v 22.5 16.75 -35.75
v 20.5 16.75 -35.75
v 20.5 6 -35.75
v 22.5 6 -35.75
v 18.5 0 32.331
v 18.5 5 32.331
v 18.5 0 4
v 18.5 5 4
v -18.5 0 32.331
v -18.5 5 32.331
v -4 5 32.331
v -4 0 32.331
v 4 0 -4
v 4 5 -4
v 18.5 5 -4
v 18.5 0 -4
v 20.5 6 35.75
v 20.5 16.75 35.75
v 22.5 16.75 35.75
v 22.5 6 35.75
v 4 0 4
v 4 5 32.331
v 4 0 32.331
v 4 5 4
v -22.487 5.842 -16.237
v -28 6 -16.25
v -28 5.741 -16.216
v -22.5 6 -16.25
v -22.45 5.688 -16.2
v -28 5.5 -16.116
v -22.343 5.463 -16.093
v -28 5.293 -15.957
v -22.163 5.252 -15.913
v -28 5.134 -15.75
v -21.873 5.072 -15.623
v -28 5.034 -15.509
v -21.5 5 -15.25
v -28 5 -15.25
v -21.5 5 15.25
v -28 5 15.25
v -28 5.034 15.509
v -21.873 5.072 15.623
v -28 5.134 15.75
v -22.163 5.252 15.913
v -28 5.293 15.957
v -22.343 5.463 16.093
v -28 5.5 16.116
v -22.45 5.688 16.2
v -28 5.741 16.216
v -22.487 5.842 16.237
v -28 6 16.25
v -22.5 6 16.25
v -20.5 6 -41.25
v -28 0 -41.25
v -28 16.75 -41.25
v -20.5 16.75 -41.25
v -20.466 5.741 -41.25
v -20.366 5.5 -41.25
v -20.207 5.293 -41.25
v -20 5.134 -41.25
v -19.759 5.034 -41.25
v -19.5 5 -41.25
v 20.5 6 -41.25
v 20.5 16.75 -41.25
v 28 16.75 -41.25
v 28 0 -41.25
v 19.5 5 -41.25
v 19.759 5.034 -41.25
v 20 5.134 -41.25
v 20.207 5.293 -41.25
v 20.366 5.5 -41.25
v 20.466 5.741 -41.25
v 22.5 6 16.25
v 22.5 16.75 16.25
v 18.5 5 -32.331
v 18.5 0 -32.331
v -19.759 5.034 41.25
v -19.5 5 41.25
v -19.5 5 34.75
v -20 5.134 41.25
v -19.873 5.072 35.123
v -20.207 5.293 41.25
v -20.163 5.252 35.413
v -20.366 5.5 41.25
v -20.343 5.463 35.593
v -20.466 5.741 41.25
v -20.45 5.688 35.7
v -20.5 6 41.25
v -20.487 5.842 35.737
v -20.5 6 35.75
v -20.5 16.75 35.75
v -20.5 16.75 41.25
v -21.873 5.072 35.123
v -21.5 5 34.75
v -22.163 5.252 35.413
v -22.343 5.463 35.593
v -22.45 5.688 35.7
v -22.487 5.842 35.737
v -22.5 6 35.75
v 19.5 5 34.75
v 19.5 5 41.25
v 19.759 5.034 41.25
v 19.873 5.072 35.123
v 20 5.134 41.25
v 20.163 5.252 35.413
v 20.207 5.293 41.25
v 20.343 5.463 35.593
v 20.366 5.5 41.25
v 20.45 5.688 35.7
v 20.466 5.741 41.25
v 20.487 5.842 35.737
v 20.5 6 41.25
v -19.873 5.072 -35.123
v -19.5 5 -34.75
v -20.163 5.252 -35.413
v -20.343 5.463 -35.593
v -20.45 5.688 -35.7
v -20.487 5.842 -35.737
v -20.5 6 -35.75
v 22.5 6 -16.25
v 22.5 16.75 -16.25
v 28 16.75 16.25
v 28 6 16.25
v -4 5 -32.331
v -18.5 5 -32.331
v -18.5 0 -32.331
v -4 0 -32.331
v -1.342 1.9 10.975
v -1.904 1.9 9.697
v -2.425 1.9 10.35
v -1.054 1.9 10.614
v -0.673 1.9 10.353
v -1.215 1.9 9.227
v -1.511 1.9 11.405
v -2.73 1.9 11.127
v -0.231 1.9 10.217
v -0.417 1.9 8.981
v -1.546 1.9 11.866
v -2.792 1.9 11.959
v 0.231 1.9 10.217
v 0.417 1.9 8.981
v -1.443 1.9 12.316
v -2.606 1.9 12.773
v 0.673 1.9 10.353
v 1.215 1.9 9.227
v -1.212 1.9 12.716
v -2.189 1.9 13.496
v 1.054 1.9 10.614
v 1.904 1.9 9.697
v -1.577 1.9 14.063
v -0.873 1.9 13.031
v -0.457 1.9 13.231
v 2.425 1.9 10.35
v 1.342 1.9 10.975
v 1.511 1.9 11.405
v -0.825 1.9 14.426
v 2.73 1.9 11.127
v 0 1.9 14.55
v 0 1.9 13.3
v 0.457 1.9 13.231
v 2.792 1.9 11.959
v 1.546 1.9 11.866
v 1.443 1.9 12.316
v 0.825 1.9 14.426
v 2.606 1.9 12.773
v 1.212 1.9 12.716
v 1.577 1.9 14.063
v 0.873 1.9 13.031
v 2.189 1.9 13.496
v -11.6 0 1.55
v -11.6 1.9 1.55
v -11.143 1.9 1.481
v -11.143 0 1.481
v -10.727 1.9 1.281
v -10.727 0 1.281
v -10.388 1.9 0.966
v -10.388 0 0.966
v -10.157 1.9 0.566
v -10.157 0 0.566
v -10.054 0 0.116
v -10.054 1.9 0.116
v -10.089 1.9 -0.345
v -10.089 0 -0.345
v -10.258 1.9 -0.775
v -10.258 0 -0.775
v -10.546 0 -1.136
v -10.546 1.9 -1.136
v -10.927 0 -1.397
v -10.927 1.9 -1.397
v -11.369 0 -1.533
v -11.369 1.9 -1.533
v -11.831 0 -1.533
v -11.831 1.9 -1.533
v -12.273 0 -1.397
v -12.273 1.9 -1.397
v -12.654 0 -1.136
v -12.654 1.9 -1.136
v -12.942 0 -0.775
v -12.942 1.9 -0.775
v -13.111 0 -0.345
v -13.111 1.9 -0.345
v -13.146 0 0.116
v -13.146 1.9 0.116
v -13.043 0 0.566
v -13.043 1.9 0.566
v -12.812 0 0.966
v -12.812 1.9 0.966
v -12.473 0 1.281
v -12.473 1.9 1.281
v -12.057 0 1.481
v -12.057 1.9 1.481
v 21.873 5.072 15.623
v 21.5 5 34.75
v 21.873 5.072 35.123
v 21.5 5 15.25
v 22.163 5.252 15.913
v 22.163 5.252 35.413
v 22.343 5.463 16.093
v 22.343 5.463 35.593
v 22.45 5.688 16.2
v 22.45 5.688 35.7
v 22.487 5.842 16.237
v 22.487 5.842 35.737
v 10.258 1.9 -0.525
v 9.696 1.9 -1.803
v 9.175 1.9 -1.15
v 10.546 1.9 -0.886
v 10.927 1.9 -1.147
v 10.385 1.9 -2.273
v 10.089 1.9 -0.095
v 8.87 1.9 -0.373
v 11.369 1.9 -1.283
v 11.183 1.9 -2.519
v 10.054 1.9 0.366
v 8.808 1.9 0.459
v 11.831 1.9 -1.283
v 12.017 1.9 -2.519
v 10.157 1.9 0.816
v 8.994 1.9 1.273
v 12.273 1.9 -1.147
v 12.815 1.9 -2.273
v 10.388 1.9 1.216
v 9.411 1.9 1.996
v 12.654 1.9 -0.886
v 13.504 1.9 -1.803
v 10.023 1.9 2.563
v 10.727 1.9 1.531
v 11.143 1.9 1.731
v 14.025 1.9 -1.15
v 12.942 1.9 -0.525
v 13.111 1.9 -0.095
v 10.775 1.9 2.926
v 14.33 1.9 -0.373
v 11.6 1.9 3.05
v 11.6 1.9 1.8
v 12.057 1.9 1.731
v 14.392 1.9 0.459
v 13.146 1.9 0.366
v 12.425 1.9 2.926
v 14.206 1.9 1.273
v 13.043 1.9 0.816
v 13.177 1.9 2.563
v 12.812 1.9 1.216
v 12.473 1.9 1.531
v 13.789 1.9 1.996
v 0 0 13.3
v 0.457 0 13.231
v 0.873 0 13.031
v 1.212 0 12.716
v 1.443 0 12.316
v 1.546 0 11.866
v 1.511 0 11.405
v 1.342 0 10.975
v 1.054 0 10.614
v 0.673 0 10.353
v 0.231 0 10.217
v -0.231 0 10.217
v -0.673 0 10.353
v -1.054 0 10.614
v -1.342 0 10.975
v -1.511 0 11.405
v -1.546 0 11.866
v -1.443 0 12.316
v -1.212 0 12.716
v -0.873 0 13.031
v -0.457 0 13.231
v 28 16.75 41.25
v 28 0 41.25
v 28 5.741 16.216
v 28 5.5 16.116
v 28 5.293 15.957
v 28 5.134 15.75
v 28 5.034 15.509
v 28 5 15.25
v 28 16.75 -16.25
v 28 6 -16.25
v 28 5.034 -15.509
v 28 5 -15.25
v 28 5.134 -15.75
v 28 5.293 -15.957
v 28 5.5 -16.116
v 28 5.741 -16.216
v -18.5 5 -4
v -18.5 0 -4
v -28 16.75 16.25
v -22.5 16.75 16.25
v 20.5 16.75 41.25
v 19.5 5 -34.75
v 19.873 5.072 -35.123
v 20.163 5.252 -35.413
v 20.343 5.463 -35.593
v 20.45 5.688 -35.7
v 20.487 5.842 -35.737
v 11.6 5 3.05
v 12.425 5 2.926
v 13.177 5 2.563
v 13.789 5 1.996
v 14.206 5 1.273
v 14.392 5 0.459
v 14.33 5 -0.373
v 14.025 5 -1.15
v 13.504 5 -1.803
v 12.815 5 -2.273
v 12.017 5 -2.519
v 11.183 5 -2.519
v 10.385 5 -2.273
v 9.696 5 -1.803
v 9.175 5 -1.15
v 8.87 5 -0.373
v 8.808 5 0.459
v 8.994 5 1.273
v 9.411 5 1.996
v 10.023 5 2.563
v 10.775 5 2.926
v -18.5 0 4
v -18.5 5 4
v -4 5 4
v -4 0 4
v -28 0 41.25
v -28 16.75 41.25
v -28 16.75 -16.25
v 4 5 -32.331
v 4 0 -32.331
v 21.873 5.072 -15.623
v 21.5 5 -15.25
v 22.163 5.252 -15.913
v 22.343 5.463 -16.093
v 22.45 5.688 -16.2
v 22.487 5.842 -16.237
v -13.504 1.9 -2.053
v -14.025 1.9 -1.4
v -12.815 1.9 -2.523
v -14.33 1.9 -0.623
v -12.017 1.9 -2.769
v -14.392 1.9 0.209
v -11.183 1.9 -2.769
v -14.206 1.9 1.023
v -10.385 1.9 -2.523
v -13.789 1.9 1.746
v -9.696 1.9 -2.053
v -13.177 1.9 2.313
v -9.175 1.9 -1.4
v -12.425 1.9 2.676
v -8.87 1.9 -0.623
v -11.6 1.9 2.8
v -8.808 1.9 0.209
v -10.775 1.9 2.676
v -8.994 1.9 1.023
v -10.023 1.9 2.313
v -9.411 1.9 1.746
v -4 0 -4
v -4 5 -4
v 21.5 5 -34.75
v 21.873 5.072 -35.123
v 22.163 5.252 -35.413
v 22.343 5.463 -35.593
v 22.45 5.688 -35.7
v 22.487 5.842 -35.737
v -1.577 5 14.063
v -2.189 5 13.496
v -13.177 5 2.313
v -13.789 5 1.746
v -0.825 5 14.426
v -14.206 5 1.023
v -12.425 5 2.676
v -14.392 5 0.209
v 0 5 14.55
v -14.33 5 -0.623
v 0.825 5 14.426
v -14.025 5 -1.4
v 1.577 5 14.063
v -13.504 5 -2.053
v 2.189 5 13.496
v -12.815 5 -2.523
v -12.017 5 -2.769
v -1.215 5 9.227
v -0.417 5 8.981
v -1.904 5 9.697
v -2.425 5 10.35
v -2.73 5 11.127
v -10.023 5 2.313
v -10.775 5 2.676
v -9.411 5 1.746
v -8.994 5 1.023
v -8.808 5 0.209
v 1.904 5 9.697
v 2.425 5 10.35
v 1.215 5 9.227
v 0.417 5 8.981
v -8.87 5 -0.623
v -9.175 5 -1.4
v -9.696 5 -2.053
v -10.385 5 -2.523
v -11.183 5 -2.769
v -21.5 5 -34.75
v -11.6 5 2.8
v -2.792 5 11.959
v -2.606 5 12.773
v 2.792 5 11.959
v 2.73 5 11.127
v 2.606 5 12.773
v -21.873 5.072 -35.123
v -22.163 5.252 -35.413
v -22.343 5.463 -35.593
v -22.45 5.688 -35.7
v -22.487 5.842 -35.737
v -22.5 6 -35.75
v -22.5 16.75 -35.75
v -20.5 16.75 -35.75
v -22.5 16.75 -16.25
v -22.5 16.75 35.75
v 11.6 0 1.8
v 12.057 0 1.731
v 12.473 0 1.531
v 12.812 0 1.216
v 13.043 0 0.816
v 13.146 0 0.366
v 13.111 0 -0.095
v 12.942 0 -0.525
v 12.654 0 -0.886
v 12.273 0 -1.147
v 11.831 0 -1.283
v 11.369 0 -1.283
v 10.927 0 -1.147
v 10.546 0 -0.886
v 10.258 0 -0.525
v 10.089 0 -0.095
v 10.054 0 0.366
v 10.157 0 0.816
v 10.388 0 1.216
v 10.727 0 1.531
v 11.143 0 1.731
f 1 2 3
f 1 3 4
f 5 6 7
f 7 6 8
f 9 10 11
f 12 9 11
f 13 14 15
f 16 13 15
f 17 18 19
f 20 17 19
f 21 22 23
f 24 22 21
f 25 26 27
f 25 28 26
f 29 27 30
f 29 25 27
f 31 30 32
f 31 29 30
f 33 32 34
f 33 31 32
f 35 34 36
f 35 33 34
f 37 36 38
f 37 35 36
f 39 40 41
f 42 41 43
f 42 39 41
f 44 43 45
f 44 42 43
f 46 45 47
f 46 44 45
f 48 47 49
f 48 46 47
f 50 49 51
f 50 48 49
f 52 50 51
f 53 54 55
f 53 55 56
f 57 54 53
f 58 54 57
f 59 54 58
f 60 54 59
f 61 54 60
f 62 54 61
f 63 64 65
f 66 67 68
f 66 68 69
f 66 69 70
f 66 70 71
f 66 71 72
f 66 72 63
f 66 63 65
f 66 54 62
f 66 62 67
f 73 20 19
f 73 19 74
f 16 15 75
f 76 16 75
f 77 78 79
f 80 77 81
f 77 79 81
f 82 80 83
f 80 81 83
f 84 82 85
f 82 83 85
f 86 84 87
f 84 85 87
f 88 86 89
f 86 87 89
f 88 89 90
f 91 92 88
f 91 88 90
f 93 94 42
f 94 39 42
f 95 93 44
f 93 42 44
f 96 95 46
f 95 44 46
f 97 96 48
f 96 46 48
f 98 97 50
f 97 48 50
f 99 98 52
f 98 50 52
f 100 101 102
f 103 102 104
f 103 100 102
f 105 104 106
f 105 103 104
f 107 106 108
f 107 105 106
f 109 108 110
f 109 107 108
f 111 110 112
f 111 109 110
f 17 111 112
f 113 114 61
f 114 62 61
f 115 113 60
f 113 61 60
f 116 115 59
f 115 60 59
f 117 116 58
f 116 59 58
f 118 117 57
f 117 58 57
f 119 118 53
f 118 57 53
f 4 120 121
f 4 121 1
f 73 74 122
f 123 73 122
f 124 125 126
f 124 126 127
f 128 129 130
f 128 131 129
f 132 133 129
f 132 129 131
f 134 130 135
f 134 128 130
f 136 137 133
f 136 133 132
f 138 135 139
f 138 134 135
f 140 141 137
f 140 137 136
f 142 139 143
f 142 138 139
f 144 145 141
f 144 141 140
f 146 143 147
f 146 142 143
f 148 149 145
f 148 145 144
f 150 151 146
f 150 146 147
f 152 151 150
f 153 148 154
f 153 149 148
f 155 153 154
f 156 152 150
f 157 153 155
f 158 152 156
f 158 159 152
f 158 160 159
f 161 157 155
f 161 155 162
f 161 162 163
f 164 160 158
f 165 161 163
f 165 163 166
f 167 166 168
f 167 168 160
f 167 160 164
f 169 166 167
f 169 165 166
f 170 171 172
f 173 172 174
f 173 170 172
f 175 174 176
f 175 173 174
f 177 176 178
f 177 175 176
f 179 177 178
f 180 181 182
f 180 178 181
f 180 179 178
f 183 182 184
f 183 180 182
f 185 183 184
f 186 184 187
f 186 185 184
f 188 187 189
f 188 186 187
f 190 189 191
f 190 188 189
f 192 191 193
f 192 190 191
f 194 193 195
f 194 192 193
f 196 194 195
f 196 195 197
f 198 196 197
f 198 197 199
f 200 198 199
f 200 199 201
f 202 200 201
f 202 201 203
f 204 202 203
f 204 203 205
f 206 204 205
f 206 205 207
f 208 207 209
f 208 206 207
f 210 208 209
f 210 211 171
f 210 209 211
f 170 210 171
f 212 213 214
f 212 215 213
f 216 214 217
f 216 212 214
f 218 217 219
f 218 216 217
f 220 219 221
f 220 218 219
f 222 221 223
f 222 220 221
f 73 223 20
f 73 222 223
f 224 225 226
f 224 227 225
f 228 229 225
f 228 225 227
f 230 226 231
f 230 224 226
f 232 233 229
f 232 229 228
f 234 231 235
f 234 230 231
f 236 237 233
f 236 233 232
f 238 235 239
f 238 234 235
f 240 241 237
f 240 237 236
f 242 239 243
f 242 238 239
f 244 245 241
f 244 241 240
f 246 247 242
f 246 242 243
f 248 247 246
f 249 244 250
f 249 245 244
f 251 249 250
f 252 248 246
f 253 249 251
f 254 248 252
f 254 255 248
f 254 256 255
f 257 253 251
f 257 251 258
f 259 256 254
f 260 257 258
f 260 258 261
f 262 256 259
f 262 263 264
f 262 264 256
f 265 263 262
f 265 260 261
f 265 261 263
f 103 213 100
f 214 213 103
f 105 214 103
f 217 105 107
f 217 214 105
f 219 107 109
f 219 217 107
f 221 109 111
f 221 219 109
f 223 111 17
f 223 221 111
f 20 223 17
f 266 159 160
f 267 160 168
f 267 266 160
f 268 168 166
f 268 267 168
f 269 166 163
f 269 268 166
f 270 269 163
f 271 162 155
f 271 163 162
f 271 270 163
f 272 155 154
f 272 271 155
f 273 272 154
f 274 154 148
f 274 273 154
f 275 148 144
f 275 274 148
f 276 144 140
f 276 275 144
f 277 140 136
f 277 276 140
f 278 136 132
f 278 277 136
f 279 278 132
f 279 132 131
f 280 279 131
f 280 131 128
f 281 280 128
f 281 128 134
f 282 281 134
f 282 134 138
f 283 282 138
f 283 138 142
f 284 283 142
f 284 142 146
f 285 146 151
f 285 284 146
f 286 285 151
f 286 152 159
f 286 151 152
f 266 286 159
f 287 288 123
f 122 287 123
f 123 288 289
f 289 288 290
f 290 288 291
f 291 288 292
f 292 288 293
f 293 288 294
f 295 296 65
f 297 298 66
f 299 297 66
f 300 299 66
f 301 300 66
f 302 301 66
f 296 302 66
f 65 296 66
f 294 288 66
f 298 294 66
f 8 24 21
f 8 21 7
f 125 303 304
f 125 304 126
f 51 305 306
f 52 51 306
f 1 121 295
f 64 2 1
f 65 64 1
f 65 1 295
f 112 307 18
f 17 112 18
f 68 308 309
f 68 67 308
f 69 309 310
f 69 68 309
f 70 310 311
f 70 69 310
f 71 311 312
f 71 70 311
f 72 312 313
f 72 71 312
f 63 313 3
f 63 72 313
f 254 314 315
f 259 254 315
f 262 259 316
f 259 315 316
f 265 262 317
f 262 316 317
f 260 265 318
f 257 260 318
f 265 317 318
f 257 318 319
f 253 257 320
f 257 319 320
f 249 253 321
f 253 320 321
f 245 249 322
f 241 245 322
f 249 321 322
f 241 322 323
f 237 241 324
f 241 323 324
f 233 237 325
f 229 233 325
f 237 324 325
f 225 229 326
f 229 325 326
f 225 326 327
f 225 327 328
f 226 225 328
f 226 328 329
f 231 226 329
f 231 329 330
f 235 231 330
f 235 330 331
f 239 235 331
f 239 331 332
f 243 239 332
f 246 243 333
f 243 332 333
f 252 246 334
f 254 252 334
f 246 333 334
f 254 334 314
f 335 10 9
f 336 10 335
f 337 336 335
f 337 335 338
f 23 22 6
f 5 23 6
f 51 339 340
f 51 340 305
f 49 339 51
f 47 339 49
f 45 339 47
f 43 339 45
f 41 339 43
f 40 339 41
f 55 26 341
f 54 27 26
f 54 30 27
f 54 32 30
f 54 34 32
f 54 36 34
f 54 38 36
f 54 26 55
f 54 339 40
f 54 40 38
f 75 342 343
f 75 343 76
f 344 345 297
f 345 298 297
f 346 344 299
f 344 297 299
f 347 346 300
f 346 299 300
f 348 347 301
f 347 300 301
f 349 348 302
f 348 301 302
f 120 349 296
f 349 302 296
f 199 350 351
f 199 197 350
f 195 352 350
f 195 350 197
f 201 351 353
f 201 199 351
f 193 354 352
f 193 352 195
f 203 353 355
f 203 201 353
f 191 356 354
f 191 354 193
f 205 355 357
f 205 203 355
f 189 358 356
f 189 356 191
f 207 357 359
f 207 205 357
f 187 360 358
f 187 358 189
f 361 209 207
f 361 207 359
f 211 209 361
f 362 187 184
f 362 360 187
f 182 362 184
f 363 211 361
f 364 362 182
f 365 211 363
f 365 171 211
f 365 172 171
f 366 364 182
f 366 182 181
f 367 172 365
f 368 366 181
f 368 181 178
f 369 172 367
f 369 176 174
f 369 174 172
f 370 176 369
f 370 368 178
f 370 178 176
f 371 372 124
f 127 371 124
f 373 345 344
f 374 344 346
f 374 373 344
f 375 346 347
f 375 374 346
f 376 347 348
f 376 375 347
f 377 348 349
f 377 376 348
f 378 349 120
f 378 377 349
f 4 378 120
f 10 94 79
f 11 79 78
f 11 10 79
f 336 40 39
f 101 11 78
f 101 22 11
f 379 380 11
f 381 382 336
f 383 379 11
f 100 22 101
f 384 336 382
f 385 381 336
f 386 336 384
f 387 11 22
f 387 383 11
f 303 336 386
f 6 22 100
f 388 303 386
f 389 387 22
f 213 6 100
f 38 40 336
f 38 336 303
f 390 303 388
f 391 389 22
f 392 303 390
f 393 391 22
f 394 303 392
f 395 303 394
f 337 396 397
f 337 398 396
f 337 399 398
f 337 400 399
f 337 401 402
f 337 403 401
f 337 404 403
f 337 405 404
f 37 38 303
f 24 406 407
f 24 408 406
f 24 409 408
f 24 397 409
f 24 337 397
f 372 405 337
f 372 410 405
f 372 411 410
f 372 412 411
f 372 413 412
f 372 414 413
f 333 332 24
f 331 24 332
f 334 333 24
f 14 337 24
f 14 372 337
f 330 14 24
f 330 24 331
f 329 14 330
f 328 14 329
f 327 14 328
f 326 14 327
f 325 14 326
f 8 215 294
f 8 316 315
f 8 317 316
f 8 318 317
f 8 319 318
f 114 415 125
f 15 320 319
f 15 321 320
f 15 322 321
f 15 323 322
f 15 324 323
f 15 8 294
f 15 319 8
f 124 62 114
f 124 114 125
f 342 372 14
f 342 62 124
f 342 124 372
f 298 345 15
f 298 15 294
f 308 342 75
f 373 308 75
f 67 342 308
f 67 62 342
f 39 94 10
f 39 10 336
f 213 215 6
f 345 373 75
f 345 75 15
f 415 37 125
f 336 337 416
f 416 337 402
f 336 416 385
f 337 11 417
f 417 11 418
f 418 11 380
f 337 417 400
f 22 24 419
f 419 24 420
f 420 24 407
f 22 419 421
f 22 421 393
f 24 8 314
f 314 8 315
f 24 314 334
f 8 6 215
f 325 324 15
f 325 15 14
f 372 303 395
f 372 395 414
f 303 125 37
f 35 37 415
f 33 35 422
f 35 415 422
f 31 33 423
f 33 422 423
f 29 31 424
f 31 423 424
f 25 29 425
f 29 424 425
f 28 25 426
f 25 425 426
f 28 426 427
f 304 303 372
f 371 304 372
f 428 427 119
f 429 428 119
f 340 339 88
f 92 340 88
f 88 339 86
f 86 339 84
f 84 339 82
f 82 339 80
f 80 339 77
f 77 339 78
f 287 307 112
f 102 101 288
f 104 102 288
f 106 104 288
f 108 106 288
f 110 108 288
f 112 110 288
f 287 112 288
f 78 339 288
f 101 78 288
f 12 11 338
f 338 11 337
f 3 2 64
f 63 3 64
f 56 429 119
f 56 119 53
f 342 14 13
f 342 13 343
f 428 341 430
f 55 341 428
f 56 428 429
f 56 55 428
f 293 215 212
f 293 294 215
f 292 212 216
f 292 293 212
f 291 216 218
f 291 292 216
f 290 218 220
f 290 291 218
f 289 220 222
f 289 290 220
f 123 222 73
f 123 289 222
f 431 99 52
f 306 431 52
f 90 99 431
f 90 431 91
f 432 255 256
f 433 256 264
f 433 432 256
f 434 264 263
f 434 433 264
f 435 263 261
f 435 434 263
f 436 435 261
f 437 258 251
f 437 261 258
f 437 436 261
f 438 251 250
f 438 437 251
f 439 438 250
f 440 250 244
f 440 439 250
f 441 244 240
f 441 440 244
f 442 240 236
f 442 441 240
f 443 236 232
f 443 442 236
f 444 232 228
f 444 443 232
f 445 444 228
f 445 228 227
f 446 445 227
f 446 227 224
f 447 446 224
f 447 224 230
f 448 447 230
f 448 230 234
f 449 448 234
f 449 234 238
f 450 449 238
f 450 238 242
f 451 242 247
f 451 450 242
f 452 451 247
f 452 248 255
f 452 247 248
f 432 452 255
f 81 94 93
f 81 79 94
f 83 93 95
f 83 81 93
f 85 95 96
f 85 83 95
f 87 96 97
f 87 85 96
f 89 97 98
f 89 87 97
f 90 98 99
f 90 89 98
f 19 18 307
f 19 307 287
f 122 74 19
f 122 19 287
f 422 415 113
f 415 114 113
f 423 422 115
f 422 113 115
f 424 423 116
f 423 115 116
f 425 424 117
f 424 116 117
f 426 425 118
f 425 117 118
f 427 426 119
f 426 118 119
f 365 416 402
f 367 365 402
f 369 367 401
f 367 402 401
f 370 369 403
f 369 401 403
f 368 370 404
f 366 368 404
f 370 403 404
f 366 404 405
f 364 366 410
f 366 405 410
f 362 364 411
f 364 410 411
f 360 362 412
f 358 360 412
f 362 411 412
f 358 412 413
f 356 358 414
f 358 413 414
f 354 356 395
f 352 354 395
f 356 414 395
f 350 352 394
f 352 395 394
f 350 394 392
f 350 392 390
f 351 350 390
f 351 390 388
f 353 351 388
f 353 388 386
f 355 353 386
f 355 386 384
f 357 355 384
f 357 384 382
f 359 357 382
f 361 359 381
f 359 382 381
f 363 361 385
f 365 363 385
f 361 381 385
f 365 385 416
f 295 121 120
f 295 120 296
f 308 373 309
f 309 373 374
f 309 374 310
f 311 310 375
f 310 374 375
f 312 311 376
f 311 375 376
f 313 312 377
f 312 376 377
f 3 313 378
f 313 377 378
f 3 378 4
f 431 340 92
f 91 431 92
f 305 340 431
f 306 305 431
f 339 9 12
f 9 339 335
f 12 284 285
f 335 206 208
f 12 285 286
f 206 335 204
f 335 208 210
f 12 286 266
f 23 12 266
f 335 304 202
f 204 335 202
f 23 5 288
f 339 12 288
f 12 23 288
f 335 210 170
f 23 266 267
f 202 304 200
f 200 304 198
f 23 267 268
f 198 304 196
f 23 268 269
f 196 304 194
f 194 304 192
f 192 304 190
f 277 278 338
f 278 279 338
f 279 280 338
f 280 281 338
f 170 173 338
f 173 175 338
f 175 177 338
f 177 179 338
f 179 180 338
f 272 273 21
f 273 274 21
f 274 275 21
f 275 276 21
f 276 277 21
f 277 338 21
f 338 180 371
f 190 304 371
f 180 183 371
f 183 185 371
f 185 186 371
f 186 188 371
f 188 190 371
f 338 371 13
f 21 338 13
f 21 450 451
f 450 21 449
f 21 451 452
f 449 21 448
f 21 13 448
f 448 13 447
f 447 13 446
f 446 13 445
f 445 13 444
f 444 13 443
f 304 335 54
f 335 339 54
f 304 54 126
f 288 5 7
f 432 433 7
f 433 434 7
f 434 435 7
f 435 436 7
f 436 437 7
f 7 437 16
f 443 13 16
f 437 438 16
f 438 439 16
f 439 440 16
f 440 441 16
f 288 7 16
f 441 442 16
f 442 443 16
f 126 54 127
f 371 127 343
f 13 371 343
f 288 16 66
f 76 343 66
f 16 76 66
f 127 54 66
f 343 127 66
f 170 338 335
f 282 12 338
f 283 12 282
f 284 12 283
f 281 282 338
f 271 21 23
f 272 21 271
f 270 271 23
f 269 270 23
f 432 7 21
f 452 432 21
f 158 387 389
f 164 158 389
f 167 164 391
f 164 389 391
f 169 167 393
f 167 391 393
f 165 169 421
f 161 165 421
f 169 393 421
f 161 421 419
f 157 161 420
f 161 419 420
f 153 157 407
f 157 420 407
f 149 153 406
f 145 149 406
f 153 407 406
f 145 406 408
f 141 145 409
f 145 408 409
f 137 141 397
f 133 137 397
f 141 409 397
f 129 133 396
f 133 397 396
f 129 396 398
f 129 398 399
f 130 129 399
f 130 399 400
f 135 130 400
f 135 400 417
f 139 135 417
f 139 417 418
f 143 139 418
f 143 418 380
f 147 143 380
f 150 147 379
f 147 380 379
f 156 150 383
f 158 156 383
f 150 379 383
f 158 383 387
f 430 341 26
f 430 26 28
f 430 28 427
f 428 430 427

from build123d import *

# Parameters (mm, degrees)
SKETCH1_W           = 56
SKETCH1_H           = 82.5
SKETCH1_R           = 1.55
BOSS_EXTRUDE1_DEPTH = 5
SKETCH2_W           = 56
SKETCH2_H           = 82.5
SKETCH2_W_2         = 45
SKETCH2_H_2         = 71.5
BOSS_EXTRUDE2_DEPTH = 11.75
SKETCH3_W           = 5.5
SKETCH3_H           = 32.5
SKETCH3_W_2         = 41
SKETCH3_H_2         = 5.5
CUT_EXTRUDE1_DEPTH  = 11.75
FILLET1_R           = 1
SKETCH5_R           = 2.8
CUT_EXTRUDE2_DEPTH  = 3.1
SKETCH6_W           = 14.5
SKETCH6_H           = 28.330895985
CUT_EXTRUDE4_DEPTH  = 52.221333446


with BuildPart() as part:
    # Sketch1 → Boss-Extrude1 (new body)
    with BuildSketch(Plane(origin=(0, 0, 0), x_dir=(1, 0, 0), z_dir=(0, 1, 0))):
        Rectangle(SKETCH1_W, SKETCH1_H)
        with Locations(Location((-11.6, 0, 0), (0, 0, 270))):
            Circle(SKETCH1_R, mode=Mode.SUBTRACT)
        with Locations(Location((0, -11.75, 0), (0, 0, 270))):
            Circle(SKETCH1_R, mode=Mode.SUBTRACT)
        with Locations(Location((11.6, -0.25, 0), (0, 0, 270))):
            Circle(SKETCH1_R, mode=Mode.SUBTRACT)
    extrude(amount=BOSS_EXTRUDE1_DEPTH)

    # Sketch2 → Boss-Extrude2 (add)
    with BuildSketch(Plane(origin=(0, 5, 0), x_dir=(1, 0, 0), z_dir=(0, 1, 0))):
        Rectangle(SKETCH2_W, SKETCH2_H)
        Rectangle(SKETCH2_W_2, SKETCH2_H_2, mode=Mode.SUBTRACT)
    extrude(amount=BOSS_EXTRUDE2_DEPTH)

    # Sketch3 → Cut-Extrude1 (cut)
    with BuildSketch(Plane(origin=(0, 16.75, 0), x_dir=(1, 0, 0), z_dir=(0, 1, 0))):
        with Locations((-25.25, 0)):
            Rectangle(SKETCH3_W, SKETCH3_H)
        with Locations((0, 38.5)):
            Rectangle(SKETCH3_W_2, SKETCH3_H_2)
        with Locations((0, -38.5)):
            Rectangle(SKETCH3_W_2, SKETCH3_H_2)
        with Locations((25.25, 0)):
            Rectangle(SKETCH3_W, SKETCH3_H)
    extrude(amount=-CUT_EXTRUDE1_DEPTH, mode=Mode.SUBTRACT)

    # Fillet1
    fillet1_edges = [part.edges().sort_by_distance(p)[0] for p in [
        (22.5, 5, 26),
        (21.5, 5, -35.75),
        (-22.5, 5, -26),
        (-21.5, 5, 35.75),
        (21.5, 5, 35.75),
        (-22.5, 5, 26),
        (-21.5, 5, -35.75),
        (22.5, 5, -26),
        (-25.25, 5, 16.25),
        (-25.25, 5, -16.25),
        (20.5, 5, -38.5),
        (-20.5, 5, -38.5),
        (20.5, 5, 38.5),
        (-20.5, 5, 38.5),
        (25.25, 5, 16.25),
        (25.25, 5, -16.25),
    ]]
    fillet(fillet1_edges, radius=FILLET1_R)

    # Sketch5 → Cut-Extrude2 (cut)
    with BuildSketch(Plane(origin=(0, 5, 0), x_dir=(1, 0, 0), z_dir=(0, 1, 0))):
        with Locations(Location((-11.6, 0, 0), (0, 0, 270))):
            Circle(SKETCH5_R)
        with Locations(Location((11.6, -0.25, 0), (0, 0, 270))):
            Circle(SKETCH5_R)
        with Locations(Location((0, -11.75, 0), (0, 0, 270))):
            Circle(SKETCH5_R)
    extrude(amount=-CUT_EXTRUDE2_DEPTH, mode=Mode.SUBTRACT)

    # Sketch6 → Cut-Extrude4 (cut, through all)
    with BuildSketch(Plane(origin=(0, 5, 0), x_dir=(1, 0, 0), z_dir=(0, 1, 0))):
        with Locations((-11.25, 18.165447993)):
            Rectangle(SKETCH6_W, SKETCH6_H)
        with Locations((11.25, 18.165447993)):
            Rectangle(SKETCH6_W, SKETCH6_H)
        with Locations((11.25, -18.165447993)):
            Rectangle(SKETCH6_W, SKETCH6_H)
        with Locations((-11.25, -18.165447993)):
            Rectangle(SKETCH6_W, SKETCH6_H)
    extrude(amount=-CUT_EXTRUDE4_DEPTH, mode=Mode.SUBTRACT)


solid = part.part
